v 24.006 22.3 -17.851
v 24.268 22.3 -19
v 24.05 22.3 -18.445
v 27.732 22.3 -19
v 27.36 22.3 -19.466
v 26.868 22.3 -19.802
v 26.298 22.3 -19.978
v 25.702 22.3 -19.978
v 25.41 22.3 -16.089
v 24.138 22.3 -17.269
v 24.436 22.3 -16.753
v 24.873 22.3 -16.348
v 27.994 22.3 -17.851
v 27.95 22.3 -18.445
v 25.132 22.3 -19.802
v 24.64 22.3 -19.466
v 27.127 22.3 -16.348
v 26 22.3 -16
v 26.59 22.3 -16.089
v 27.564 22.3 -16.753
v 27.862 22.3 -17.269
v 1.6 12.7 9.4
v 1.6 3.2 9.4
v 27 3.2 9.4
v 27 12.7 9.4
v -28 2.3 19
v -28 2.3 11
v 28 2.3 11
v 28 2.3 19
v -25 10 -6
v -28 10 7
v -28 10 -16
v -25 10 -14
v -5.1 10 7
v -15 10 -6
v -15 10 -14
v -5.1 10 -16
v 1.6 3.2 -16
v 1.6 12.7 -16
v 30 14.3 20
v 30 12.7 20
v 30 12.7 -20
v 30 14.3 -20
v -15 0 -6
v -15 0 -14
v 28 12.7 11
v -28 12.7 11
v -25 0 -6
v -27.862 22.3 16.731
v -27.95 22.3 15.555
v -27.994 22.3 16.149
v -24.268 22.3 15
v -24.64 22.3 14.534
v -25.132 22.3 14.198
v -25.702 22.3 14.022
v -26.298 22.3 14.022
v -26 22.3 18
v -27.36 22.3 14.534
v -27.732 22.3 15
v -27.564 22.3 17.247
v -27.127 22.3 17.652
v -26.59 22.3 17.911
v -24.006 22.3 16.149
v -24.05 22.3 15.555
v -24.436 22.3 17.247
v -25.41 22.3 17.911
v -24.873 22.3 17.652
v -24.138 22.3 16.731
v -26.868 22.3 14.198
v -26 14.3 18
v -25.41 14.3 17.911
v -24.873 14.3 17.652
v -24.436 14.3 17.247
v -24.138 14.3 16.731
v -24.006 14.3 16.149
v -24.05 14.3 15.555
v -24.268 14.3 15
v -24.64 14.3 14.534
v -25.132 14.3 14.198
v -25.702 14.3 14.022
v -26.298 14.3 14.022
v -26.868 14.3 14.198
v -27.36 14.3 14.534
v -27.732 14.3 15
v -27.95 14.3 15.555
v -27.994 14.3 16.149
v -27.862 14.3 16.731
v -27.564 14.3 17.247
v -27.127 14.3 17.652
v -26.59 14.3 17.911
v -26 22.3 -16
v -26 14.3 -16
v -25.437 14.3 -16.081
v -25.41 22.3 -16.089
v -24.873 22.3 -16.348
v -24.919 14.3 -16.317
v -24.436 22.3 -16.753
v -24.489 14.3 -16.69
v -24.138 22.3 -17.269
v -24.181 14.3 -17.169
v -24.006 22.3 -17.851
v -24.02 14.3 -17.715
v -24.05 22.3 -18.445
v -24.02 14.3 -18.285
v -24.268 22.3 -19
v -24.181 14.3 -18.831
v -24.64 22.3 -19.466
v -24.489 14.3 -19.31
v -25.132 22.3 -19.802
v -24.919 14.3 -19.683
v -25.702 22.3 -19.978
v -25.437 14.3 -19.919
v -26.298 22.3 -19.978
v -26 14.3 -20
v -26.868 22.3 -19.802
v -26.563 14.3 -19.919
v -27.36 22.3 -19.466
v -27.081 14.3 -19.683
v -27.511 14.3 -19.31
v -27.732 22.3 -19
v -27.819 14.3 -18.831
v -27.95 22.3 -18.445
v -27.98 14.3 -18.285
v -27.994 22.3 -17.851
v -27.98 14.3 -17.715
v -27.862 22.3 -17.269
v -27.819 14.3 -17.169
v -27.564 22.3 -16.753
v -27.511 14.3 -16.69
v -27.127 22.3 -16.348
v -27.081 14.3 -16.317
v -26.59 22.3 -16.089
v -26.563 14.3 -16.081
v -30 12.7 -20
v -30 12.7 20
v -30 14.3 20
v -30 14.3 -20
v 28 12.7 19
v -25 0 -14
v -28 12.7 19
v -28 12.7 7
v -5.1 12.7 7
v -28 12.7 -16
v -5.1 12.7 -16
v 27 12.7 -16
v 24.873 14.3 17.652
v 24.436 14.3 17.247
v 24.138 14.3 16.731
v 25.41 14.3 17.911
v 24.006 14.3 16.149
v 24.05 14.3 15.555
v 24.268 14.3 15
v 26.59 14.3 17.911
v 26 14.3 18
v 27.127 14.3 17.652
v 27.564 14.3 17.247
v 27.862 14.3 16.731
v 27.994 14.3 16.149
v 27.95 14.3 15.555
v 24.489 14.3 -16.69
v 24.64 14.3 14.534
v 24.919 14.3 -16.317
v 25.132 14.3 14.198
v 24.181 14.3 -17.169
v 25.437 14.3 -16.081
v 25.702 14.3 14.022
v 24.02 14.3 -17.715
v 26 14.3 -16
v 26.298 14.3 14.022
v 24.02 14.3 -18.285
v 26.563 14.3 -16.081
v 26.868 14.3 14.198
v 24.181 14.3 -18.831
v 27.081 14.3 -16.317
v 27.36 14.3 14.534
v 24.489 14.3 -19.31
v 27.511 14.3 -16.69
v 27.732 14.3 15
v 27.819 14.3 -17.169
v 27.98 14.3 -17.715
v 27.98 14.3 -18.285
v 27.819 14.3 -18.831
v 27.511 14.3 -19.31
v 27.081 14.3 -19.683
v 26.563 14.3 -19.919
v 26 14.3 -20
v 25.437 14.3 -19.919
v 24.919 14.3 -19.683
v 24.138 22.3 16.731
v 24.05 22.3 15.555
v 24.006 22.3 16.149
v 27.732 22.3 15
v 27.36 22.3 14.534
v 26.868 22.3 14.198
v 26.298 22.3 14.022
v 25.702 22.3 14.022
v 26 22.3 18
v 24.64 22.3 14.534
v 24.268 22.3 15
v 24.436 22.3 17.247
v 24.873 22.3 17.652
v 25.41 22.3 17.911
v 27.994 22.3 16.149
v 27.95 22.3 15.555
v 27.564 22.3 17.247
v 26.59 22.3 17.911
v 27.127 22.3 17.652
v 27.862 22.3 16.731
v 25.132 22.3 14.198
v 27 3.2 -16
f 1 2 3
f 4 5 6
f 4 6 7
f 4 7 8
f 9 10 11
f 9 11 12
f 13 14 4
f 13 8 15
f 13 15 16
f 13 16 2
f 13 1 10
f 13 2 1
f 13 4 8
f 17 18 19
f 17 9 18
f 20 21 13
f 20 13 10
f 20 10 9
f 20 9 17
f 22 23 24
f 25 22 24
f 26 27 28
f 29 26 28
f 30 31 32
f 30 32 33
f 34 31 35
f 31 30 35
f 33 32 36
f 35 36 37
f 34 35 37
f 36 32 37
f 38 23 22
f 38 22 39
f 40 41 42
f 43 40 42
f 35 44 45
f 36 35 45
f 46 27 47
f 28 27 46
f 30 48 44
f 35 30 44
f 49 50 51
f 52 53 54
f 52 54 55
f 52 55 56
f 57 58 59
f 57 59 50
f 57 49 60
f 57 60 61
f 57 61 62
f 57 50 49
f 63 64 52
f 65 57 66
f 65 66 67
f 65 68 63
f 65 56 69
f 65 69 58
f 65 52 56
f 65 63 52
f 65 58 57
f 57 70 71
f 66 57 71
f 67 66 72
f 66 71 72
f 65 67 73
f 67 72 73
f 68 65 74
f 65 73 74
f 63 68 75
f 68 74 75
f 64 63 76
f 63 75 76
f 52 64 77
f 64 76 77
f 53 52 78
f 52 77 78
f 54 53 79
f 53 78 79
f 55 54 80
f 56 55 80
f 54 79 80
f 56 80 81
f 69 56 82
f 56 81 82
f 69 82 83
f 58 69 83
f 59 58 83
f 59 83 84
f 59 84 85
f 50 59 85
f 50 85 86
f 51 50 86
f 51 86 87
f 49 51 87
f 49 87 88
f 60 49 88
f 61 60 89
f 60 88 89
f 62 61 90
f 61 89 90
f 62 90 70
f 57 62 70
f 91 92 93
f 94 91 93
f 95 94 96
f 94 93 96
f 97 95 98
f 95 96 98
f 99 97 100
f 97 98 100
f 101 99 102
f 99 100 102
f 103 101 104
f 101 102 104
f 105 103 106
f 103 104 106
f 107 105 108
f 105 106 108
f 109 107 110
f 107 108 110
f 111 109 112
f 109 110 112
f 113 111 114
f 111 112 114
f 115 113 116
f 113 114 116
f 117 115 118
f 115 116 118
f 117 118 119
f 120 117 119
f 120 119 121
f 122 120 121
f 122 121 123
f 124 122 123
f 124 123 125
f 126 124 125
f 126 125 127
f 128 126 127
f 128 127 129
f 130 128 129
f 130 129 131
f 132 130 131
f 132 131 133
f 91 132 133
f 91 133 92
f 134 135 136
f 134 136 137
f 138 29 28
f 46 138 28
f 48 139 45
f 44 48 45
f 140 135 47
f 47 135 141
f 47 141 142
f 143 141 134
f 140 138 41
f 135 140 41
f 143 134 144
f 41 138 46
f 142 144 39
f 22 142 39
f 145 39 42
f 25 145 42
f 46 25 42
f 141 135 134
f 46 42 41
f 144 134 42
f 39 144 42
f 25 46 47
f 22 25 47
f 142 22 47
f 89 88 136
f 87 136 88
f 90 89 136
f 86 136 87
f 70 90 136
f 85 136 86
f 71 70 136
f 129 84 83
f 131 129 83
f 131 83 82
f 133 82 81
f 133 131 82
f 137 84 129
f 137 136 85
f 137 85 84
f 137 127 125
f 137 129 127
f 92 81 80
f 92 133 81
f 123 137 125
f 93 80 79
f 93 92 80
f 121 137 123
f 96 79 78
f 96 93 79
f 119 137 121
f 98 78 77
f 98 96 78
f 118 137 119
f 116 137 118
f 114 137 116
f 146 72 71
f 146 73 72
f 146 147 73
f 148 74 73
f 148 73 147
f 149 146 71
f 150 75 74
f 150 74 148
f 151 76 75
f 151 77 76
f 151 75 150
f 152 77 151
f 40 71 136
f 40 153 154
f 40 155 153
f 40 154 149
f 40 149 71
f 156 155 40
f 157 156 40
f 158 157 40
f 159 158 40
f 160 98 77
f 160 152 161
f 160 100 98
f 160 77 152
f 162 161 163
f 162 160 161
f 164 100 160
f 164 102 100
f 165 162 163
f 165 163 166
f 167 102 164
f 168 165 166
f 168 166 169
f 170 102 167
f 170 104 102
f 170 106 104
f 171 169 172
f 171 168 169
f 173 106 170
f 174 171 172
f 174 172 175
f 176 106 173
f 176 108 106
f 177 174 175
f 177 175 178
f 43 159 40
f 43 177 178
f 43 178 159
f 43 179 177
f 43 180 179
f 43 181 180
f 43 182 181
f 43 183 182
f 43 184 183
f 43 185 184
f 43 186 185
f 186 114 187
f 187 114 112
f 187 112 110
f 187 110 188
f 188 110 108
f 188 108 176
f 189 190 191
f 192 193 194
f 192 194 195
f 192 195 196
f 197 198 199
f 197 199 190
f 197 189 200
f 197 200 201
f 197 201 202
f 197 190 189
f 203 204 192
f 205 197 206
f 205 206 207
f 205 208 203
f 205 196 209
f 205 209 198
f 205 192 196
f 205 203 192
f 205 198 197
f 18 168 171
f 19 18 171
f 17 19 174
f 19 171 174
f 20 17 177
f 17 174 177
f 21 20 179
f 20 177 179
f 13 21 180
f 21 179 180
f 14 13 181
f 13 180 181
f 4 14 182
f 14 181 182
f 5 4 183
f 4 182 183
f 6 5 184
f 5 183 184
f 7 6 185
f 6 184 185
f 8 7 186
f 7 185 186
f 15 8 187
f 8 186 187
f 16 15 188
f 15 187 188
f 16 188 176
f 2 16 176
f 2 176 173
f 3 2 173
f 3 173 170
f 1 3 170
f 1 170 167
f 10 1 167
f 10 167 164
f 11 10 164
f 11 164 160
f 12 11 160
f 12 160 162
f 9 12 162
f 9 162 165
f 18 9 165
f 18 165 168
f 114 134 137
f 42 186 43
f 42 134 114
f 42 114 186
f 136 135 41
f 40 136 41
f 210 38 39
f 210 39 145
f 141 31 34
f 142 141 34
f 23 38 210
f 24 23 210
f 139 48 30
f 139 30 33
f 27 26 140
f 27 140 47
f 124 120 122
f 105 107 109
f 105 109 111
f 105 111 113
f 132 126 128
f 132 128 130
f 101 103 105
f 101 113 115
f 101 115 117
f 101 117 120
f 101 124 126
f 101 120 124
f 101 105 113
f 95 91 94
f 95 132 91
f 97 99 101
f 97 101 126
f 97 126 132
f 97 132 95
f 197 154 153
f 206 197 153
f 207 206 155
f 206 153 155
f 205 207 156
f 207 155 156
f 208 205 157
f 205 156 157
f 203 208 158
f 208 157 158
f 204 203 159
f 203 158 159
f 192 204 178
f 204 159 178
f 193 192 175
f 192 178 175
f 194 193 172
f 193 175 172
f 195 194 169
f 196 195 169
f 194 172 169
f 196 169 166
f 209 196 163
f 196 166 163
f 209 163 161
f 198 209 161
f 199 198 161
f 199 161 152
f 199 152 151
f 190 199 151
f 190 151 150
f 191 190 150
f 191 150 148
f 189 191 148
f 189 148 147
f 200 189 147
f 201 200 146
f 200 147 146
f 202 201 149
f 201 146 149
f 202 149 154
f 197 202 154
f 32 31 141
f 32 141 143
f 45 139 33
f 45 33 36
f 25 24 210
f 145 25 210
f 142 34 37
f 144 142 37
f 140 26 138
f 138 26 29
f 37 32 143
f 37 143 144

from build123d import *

# Parameters (mm, degrees)
P01_STANDOFF_START             = 14.3
SK_P01_STANDOFF_R              = 2
P01_STANDOFF_DEPTH             = 8
P02_STANDOFF_START             = 14.3
SK_P02_STANDOFF_R              = 2
P02_STANDOFF_DEPTH             = 8
P03_STANDOFF_START             = 14.3
SK_P03_STANDOFF_R              = 2
P03_STANDOFF_DEPTH             = 8
P04_STANDOFF_START             = 14.3
SK_P04_STANDOFF_R              = 2
P04_STANDOFF_DEPTH             = 8
P05_CARRIERBOARD_START         = 12.7
SK_P05_CARRIERBOARD_W          = 60
SK_P05_CARRIERBOARD_H          = 40
P05_CARRIERBOARD_DEPTH         = 1.6
P06_INA2603SENSOR_START        = 10
SK_P06_INA2603SENSOR_W         = 22.9
SK_P06_INA2603SENSOR_H         = 23
P06_INA2603SENSOR_DEPTH        = 2.7
SK_P07_INA260TERMINALBLOCK_W   = 10
SK_P07_INA260TERMINALBLOCK_H   = 8
P07_INA260TERMINALBLOCK_DEPTH  = 10
P08_BUCKBD36V50F55V_START      = 3.2
SK_P08_BUCKBD36V50F55V_W       = 25.4
SK_P08_BUCKBD36V50F55V_H       = 25.4
P08_BUCKBD36V50F55V_DEPTH      = 9.5
P09_JSTXHHEADERSFACEDOWN_START = 2.3
SK_P09_JSTXHHEADERSFACEDOWN_W  = 56
SK_P09_JSTXHHEADERSFACEDOWN_H  = 8
P09_JSTXHHEADERSFACEDOWN_DEPTH = 10.4


with BuildPart() as part:
    # SK_P01_Standoff → P01_Standoff (new body)
    with BuildSketch(Plane(origin=(0, 0, 0), x_dir=(1, 0, 0), z_dir=(0, 1, 0)).offset(P01_STANDOFF_START)):
        with Locations(Location((-26, 18, 0), (0, 0, 270))):
            Circle(SK_P01_STANDOFF_R)
    extrude(amount=P01_STANDOFF_DEPTH)



with BuildPart() as body_2:
    # SK_P02_Standoff → P02_Standoff (new body)
    with BuildSketch(Plane(origin=(0, 0, 0), x_dir=(1, 0, 0), z_dir=(0, 1, 0)).offset(P02_STANDOFF_START)):
        with Locations(Location((-26, -16, 0), (0, 0, 270))):
            Circle(SK_P02_STANDOFF_R)
    extrude(amount=P02_STANDOFF_DEPTH)


with BuildPart() as body_3:
    # SK_P03_Standoff → P03_Standoff (new body)
    with BuildSketch(Plane(origin=(0, 0, 0), x_dir=(1, 0, 0), z_dir=(0, 1, 0)).offset(P03_STANDOFF_START)):
        with Locations(Location((26, 18, 0), (0, 0, 270))):
            Circle(SK_P03_STANDOFF_R)
    extrude(amount=P03_STANDOFF_DEPTH)


with BuildPart() as body_4:
    # SK_P04_Standoff → P04_Standoff (new body)
    with BuildSketch(Plane(origin=(0, 0, 0), x_dir=(1, 0, 0), z_dir=(0, 1, 0)).offset(P04_STANDOFF_START)):
        with Locations(Location((26, -16, 0), (0, 0, 270))):
            Circle(SK_P04_STANDOFF_R)
    extrude(amount=P04_STANDOFF_DEPTH)


with BuildPart() as part_1:
    add(part.part)

    add(body_2.part)  # P05_Carrierboard merges body 2

    add(body_3.part)  # P05_Carrierboard merges body 3

    add(body_4.part)  # P05_Carrierboard merges body 4
    # SK_P05_Carrierboard → P05_Carrierboard (add)
    with BuildSketch(Plane(origin=(0, 0, 0), x_dir=(1, 0, 0), z_dir=(0, 1, 0)).offset(P05_CARRIERBOARD_START)):
        Rectangle(SK_P05_CARRIERBOARD_W, SK_P05_CARRIERBOARD_H)
    extrude(amount=P05_CARRIERBOARD_DEPTH)

    # SK_P06_INA2603sensor → P06_INA2603sensor (add)
    with BuildSketch(Plane(origin=(0, 0, 0), x_dir=(1, 0, 0), z_dir=(0, 1, 0)).offset(P06_INA2603SENSOR_START)):
        with Locations((-16.55, 4.5)):
            Rectangle(SK_P06_INA2603SENSOR_W, SK_P06_INA2603SENSOR_H)
    extrude(amount=P06_INA2603SENSOR_DEPTH)

    # SK_P07_INA260terminalblock → P07_INA260terminalblock (add)
    with BuildSketch(Plane(origin=(0, 0, 0), x_dir=(1, 0, 0), z_dir=(0, 1, 0))):
        with Locations((-20, 10)):
            Rectangle(SK_P07_INA260TERMINALBLOCK_W, SK_P07_INA260TERMINALBLOCK_H)
    extrude(amount=P07_INA260TERMINALBLOCK_DEPTH)

    # SK_P08_BuckBD36V50F55V → P08_BuckBD36V50F55V (add)
    with BuildSketch(Plane(origin=(0, 0, 0), x_dir=(1, 0, 0), z_dir=(0, 1, 0)).offset(P08_BUCKBD36V50F55V_START)):
        with Locations((14.3, 3.3)):
            Rectangle(SK_P08_BUCKBD36V50F55V_W, SK_P08_BUCKBD36V50F55V_H)
    extrude(amount=P08_BUCKBD36V50F55V_DEPTH)

    # SK_P09_JSTXHheadersfacedown → P09_JSTXHheadersfacedown (add)
    with BuildSketch(Plane(origin=(0, 0, 0), x_dir=(1, 0, 0), z_dir=(0, 1, 0)).offset(P09_JSTXHHEADERSFACEDOWN_START)):
        with Locations((0, -15)):
            Rectangle(SK_P09_JSTXHHEADERSFACEDOWN_W, SK_P09_JSTXHHEADERSFACEDOWN_H)
    extrude(amount=P09_JSTXHHEADERSFACEDOWN_DEPTH)


solid = part_1.part
